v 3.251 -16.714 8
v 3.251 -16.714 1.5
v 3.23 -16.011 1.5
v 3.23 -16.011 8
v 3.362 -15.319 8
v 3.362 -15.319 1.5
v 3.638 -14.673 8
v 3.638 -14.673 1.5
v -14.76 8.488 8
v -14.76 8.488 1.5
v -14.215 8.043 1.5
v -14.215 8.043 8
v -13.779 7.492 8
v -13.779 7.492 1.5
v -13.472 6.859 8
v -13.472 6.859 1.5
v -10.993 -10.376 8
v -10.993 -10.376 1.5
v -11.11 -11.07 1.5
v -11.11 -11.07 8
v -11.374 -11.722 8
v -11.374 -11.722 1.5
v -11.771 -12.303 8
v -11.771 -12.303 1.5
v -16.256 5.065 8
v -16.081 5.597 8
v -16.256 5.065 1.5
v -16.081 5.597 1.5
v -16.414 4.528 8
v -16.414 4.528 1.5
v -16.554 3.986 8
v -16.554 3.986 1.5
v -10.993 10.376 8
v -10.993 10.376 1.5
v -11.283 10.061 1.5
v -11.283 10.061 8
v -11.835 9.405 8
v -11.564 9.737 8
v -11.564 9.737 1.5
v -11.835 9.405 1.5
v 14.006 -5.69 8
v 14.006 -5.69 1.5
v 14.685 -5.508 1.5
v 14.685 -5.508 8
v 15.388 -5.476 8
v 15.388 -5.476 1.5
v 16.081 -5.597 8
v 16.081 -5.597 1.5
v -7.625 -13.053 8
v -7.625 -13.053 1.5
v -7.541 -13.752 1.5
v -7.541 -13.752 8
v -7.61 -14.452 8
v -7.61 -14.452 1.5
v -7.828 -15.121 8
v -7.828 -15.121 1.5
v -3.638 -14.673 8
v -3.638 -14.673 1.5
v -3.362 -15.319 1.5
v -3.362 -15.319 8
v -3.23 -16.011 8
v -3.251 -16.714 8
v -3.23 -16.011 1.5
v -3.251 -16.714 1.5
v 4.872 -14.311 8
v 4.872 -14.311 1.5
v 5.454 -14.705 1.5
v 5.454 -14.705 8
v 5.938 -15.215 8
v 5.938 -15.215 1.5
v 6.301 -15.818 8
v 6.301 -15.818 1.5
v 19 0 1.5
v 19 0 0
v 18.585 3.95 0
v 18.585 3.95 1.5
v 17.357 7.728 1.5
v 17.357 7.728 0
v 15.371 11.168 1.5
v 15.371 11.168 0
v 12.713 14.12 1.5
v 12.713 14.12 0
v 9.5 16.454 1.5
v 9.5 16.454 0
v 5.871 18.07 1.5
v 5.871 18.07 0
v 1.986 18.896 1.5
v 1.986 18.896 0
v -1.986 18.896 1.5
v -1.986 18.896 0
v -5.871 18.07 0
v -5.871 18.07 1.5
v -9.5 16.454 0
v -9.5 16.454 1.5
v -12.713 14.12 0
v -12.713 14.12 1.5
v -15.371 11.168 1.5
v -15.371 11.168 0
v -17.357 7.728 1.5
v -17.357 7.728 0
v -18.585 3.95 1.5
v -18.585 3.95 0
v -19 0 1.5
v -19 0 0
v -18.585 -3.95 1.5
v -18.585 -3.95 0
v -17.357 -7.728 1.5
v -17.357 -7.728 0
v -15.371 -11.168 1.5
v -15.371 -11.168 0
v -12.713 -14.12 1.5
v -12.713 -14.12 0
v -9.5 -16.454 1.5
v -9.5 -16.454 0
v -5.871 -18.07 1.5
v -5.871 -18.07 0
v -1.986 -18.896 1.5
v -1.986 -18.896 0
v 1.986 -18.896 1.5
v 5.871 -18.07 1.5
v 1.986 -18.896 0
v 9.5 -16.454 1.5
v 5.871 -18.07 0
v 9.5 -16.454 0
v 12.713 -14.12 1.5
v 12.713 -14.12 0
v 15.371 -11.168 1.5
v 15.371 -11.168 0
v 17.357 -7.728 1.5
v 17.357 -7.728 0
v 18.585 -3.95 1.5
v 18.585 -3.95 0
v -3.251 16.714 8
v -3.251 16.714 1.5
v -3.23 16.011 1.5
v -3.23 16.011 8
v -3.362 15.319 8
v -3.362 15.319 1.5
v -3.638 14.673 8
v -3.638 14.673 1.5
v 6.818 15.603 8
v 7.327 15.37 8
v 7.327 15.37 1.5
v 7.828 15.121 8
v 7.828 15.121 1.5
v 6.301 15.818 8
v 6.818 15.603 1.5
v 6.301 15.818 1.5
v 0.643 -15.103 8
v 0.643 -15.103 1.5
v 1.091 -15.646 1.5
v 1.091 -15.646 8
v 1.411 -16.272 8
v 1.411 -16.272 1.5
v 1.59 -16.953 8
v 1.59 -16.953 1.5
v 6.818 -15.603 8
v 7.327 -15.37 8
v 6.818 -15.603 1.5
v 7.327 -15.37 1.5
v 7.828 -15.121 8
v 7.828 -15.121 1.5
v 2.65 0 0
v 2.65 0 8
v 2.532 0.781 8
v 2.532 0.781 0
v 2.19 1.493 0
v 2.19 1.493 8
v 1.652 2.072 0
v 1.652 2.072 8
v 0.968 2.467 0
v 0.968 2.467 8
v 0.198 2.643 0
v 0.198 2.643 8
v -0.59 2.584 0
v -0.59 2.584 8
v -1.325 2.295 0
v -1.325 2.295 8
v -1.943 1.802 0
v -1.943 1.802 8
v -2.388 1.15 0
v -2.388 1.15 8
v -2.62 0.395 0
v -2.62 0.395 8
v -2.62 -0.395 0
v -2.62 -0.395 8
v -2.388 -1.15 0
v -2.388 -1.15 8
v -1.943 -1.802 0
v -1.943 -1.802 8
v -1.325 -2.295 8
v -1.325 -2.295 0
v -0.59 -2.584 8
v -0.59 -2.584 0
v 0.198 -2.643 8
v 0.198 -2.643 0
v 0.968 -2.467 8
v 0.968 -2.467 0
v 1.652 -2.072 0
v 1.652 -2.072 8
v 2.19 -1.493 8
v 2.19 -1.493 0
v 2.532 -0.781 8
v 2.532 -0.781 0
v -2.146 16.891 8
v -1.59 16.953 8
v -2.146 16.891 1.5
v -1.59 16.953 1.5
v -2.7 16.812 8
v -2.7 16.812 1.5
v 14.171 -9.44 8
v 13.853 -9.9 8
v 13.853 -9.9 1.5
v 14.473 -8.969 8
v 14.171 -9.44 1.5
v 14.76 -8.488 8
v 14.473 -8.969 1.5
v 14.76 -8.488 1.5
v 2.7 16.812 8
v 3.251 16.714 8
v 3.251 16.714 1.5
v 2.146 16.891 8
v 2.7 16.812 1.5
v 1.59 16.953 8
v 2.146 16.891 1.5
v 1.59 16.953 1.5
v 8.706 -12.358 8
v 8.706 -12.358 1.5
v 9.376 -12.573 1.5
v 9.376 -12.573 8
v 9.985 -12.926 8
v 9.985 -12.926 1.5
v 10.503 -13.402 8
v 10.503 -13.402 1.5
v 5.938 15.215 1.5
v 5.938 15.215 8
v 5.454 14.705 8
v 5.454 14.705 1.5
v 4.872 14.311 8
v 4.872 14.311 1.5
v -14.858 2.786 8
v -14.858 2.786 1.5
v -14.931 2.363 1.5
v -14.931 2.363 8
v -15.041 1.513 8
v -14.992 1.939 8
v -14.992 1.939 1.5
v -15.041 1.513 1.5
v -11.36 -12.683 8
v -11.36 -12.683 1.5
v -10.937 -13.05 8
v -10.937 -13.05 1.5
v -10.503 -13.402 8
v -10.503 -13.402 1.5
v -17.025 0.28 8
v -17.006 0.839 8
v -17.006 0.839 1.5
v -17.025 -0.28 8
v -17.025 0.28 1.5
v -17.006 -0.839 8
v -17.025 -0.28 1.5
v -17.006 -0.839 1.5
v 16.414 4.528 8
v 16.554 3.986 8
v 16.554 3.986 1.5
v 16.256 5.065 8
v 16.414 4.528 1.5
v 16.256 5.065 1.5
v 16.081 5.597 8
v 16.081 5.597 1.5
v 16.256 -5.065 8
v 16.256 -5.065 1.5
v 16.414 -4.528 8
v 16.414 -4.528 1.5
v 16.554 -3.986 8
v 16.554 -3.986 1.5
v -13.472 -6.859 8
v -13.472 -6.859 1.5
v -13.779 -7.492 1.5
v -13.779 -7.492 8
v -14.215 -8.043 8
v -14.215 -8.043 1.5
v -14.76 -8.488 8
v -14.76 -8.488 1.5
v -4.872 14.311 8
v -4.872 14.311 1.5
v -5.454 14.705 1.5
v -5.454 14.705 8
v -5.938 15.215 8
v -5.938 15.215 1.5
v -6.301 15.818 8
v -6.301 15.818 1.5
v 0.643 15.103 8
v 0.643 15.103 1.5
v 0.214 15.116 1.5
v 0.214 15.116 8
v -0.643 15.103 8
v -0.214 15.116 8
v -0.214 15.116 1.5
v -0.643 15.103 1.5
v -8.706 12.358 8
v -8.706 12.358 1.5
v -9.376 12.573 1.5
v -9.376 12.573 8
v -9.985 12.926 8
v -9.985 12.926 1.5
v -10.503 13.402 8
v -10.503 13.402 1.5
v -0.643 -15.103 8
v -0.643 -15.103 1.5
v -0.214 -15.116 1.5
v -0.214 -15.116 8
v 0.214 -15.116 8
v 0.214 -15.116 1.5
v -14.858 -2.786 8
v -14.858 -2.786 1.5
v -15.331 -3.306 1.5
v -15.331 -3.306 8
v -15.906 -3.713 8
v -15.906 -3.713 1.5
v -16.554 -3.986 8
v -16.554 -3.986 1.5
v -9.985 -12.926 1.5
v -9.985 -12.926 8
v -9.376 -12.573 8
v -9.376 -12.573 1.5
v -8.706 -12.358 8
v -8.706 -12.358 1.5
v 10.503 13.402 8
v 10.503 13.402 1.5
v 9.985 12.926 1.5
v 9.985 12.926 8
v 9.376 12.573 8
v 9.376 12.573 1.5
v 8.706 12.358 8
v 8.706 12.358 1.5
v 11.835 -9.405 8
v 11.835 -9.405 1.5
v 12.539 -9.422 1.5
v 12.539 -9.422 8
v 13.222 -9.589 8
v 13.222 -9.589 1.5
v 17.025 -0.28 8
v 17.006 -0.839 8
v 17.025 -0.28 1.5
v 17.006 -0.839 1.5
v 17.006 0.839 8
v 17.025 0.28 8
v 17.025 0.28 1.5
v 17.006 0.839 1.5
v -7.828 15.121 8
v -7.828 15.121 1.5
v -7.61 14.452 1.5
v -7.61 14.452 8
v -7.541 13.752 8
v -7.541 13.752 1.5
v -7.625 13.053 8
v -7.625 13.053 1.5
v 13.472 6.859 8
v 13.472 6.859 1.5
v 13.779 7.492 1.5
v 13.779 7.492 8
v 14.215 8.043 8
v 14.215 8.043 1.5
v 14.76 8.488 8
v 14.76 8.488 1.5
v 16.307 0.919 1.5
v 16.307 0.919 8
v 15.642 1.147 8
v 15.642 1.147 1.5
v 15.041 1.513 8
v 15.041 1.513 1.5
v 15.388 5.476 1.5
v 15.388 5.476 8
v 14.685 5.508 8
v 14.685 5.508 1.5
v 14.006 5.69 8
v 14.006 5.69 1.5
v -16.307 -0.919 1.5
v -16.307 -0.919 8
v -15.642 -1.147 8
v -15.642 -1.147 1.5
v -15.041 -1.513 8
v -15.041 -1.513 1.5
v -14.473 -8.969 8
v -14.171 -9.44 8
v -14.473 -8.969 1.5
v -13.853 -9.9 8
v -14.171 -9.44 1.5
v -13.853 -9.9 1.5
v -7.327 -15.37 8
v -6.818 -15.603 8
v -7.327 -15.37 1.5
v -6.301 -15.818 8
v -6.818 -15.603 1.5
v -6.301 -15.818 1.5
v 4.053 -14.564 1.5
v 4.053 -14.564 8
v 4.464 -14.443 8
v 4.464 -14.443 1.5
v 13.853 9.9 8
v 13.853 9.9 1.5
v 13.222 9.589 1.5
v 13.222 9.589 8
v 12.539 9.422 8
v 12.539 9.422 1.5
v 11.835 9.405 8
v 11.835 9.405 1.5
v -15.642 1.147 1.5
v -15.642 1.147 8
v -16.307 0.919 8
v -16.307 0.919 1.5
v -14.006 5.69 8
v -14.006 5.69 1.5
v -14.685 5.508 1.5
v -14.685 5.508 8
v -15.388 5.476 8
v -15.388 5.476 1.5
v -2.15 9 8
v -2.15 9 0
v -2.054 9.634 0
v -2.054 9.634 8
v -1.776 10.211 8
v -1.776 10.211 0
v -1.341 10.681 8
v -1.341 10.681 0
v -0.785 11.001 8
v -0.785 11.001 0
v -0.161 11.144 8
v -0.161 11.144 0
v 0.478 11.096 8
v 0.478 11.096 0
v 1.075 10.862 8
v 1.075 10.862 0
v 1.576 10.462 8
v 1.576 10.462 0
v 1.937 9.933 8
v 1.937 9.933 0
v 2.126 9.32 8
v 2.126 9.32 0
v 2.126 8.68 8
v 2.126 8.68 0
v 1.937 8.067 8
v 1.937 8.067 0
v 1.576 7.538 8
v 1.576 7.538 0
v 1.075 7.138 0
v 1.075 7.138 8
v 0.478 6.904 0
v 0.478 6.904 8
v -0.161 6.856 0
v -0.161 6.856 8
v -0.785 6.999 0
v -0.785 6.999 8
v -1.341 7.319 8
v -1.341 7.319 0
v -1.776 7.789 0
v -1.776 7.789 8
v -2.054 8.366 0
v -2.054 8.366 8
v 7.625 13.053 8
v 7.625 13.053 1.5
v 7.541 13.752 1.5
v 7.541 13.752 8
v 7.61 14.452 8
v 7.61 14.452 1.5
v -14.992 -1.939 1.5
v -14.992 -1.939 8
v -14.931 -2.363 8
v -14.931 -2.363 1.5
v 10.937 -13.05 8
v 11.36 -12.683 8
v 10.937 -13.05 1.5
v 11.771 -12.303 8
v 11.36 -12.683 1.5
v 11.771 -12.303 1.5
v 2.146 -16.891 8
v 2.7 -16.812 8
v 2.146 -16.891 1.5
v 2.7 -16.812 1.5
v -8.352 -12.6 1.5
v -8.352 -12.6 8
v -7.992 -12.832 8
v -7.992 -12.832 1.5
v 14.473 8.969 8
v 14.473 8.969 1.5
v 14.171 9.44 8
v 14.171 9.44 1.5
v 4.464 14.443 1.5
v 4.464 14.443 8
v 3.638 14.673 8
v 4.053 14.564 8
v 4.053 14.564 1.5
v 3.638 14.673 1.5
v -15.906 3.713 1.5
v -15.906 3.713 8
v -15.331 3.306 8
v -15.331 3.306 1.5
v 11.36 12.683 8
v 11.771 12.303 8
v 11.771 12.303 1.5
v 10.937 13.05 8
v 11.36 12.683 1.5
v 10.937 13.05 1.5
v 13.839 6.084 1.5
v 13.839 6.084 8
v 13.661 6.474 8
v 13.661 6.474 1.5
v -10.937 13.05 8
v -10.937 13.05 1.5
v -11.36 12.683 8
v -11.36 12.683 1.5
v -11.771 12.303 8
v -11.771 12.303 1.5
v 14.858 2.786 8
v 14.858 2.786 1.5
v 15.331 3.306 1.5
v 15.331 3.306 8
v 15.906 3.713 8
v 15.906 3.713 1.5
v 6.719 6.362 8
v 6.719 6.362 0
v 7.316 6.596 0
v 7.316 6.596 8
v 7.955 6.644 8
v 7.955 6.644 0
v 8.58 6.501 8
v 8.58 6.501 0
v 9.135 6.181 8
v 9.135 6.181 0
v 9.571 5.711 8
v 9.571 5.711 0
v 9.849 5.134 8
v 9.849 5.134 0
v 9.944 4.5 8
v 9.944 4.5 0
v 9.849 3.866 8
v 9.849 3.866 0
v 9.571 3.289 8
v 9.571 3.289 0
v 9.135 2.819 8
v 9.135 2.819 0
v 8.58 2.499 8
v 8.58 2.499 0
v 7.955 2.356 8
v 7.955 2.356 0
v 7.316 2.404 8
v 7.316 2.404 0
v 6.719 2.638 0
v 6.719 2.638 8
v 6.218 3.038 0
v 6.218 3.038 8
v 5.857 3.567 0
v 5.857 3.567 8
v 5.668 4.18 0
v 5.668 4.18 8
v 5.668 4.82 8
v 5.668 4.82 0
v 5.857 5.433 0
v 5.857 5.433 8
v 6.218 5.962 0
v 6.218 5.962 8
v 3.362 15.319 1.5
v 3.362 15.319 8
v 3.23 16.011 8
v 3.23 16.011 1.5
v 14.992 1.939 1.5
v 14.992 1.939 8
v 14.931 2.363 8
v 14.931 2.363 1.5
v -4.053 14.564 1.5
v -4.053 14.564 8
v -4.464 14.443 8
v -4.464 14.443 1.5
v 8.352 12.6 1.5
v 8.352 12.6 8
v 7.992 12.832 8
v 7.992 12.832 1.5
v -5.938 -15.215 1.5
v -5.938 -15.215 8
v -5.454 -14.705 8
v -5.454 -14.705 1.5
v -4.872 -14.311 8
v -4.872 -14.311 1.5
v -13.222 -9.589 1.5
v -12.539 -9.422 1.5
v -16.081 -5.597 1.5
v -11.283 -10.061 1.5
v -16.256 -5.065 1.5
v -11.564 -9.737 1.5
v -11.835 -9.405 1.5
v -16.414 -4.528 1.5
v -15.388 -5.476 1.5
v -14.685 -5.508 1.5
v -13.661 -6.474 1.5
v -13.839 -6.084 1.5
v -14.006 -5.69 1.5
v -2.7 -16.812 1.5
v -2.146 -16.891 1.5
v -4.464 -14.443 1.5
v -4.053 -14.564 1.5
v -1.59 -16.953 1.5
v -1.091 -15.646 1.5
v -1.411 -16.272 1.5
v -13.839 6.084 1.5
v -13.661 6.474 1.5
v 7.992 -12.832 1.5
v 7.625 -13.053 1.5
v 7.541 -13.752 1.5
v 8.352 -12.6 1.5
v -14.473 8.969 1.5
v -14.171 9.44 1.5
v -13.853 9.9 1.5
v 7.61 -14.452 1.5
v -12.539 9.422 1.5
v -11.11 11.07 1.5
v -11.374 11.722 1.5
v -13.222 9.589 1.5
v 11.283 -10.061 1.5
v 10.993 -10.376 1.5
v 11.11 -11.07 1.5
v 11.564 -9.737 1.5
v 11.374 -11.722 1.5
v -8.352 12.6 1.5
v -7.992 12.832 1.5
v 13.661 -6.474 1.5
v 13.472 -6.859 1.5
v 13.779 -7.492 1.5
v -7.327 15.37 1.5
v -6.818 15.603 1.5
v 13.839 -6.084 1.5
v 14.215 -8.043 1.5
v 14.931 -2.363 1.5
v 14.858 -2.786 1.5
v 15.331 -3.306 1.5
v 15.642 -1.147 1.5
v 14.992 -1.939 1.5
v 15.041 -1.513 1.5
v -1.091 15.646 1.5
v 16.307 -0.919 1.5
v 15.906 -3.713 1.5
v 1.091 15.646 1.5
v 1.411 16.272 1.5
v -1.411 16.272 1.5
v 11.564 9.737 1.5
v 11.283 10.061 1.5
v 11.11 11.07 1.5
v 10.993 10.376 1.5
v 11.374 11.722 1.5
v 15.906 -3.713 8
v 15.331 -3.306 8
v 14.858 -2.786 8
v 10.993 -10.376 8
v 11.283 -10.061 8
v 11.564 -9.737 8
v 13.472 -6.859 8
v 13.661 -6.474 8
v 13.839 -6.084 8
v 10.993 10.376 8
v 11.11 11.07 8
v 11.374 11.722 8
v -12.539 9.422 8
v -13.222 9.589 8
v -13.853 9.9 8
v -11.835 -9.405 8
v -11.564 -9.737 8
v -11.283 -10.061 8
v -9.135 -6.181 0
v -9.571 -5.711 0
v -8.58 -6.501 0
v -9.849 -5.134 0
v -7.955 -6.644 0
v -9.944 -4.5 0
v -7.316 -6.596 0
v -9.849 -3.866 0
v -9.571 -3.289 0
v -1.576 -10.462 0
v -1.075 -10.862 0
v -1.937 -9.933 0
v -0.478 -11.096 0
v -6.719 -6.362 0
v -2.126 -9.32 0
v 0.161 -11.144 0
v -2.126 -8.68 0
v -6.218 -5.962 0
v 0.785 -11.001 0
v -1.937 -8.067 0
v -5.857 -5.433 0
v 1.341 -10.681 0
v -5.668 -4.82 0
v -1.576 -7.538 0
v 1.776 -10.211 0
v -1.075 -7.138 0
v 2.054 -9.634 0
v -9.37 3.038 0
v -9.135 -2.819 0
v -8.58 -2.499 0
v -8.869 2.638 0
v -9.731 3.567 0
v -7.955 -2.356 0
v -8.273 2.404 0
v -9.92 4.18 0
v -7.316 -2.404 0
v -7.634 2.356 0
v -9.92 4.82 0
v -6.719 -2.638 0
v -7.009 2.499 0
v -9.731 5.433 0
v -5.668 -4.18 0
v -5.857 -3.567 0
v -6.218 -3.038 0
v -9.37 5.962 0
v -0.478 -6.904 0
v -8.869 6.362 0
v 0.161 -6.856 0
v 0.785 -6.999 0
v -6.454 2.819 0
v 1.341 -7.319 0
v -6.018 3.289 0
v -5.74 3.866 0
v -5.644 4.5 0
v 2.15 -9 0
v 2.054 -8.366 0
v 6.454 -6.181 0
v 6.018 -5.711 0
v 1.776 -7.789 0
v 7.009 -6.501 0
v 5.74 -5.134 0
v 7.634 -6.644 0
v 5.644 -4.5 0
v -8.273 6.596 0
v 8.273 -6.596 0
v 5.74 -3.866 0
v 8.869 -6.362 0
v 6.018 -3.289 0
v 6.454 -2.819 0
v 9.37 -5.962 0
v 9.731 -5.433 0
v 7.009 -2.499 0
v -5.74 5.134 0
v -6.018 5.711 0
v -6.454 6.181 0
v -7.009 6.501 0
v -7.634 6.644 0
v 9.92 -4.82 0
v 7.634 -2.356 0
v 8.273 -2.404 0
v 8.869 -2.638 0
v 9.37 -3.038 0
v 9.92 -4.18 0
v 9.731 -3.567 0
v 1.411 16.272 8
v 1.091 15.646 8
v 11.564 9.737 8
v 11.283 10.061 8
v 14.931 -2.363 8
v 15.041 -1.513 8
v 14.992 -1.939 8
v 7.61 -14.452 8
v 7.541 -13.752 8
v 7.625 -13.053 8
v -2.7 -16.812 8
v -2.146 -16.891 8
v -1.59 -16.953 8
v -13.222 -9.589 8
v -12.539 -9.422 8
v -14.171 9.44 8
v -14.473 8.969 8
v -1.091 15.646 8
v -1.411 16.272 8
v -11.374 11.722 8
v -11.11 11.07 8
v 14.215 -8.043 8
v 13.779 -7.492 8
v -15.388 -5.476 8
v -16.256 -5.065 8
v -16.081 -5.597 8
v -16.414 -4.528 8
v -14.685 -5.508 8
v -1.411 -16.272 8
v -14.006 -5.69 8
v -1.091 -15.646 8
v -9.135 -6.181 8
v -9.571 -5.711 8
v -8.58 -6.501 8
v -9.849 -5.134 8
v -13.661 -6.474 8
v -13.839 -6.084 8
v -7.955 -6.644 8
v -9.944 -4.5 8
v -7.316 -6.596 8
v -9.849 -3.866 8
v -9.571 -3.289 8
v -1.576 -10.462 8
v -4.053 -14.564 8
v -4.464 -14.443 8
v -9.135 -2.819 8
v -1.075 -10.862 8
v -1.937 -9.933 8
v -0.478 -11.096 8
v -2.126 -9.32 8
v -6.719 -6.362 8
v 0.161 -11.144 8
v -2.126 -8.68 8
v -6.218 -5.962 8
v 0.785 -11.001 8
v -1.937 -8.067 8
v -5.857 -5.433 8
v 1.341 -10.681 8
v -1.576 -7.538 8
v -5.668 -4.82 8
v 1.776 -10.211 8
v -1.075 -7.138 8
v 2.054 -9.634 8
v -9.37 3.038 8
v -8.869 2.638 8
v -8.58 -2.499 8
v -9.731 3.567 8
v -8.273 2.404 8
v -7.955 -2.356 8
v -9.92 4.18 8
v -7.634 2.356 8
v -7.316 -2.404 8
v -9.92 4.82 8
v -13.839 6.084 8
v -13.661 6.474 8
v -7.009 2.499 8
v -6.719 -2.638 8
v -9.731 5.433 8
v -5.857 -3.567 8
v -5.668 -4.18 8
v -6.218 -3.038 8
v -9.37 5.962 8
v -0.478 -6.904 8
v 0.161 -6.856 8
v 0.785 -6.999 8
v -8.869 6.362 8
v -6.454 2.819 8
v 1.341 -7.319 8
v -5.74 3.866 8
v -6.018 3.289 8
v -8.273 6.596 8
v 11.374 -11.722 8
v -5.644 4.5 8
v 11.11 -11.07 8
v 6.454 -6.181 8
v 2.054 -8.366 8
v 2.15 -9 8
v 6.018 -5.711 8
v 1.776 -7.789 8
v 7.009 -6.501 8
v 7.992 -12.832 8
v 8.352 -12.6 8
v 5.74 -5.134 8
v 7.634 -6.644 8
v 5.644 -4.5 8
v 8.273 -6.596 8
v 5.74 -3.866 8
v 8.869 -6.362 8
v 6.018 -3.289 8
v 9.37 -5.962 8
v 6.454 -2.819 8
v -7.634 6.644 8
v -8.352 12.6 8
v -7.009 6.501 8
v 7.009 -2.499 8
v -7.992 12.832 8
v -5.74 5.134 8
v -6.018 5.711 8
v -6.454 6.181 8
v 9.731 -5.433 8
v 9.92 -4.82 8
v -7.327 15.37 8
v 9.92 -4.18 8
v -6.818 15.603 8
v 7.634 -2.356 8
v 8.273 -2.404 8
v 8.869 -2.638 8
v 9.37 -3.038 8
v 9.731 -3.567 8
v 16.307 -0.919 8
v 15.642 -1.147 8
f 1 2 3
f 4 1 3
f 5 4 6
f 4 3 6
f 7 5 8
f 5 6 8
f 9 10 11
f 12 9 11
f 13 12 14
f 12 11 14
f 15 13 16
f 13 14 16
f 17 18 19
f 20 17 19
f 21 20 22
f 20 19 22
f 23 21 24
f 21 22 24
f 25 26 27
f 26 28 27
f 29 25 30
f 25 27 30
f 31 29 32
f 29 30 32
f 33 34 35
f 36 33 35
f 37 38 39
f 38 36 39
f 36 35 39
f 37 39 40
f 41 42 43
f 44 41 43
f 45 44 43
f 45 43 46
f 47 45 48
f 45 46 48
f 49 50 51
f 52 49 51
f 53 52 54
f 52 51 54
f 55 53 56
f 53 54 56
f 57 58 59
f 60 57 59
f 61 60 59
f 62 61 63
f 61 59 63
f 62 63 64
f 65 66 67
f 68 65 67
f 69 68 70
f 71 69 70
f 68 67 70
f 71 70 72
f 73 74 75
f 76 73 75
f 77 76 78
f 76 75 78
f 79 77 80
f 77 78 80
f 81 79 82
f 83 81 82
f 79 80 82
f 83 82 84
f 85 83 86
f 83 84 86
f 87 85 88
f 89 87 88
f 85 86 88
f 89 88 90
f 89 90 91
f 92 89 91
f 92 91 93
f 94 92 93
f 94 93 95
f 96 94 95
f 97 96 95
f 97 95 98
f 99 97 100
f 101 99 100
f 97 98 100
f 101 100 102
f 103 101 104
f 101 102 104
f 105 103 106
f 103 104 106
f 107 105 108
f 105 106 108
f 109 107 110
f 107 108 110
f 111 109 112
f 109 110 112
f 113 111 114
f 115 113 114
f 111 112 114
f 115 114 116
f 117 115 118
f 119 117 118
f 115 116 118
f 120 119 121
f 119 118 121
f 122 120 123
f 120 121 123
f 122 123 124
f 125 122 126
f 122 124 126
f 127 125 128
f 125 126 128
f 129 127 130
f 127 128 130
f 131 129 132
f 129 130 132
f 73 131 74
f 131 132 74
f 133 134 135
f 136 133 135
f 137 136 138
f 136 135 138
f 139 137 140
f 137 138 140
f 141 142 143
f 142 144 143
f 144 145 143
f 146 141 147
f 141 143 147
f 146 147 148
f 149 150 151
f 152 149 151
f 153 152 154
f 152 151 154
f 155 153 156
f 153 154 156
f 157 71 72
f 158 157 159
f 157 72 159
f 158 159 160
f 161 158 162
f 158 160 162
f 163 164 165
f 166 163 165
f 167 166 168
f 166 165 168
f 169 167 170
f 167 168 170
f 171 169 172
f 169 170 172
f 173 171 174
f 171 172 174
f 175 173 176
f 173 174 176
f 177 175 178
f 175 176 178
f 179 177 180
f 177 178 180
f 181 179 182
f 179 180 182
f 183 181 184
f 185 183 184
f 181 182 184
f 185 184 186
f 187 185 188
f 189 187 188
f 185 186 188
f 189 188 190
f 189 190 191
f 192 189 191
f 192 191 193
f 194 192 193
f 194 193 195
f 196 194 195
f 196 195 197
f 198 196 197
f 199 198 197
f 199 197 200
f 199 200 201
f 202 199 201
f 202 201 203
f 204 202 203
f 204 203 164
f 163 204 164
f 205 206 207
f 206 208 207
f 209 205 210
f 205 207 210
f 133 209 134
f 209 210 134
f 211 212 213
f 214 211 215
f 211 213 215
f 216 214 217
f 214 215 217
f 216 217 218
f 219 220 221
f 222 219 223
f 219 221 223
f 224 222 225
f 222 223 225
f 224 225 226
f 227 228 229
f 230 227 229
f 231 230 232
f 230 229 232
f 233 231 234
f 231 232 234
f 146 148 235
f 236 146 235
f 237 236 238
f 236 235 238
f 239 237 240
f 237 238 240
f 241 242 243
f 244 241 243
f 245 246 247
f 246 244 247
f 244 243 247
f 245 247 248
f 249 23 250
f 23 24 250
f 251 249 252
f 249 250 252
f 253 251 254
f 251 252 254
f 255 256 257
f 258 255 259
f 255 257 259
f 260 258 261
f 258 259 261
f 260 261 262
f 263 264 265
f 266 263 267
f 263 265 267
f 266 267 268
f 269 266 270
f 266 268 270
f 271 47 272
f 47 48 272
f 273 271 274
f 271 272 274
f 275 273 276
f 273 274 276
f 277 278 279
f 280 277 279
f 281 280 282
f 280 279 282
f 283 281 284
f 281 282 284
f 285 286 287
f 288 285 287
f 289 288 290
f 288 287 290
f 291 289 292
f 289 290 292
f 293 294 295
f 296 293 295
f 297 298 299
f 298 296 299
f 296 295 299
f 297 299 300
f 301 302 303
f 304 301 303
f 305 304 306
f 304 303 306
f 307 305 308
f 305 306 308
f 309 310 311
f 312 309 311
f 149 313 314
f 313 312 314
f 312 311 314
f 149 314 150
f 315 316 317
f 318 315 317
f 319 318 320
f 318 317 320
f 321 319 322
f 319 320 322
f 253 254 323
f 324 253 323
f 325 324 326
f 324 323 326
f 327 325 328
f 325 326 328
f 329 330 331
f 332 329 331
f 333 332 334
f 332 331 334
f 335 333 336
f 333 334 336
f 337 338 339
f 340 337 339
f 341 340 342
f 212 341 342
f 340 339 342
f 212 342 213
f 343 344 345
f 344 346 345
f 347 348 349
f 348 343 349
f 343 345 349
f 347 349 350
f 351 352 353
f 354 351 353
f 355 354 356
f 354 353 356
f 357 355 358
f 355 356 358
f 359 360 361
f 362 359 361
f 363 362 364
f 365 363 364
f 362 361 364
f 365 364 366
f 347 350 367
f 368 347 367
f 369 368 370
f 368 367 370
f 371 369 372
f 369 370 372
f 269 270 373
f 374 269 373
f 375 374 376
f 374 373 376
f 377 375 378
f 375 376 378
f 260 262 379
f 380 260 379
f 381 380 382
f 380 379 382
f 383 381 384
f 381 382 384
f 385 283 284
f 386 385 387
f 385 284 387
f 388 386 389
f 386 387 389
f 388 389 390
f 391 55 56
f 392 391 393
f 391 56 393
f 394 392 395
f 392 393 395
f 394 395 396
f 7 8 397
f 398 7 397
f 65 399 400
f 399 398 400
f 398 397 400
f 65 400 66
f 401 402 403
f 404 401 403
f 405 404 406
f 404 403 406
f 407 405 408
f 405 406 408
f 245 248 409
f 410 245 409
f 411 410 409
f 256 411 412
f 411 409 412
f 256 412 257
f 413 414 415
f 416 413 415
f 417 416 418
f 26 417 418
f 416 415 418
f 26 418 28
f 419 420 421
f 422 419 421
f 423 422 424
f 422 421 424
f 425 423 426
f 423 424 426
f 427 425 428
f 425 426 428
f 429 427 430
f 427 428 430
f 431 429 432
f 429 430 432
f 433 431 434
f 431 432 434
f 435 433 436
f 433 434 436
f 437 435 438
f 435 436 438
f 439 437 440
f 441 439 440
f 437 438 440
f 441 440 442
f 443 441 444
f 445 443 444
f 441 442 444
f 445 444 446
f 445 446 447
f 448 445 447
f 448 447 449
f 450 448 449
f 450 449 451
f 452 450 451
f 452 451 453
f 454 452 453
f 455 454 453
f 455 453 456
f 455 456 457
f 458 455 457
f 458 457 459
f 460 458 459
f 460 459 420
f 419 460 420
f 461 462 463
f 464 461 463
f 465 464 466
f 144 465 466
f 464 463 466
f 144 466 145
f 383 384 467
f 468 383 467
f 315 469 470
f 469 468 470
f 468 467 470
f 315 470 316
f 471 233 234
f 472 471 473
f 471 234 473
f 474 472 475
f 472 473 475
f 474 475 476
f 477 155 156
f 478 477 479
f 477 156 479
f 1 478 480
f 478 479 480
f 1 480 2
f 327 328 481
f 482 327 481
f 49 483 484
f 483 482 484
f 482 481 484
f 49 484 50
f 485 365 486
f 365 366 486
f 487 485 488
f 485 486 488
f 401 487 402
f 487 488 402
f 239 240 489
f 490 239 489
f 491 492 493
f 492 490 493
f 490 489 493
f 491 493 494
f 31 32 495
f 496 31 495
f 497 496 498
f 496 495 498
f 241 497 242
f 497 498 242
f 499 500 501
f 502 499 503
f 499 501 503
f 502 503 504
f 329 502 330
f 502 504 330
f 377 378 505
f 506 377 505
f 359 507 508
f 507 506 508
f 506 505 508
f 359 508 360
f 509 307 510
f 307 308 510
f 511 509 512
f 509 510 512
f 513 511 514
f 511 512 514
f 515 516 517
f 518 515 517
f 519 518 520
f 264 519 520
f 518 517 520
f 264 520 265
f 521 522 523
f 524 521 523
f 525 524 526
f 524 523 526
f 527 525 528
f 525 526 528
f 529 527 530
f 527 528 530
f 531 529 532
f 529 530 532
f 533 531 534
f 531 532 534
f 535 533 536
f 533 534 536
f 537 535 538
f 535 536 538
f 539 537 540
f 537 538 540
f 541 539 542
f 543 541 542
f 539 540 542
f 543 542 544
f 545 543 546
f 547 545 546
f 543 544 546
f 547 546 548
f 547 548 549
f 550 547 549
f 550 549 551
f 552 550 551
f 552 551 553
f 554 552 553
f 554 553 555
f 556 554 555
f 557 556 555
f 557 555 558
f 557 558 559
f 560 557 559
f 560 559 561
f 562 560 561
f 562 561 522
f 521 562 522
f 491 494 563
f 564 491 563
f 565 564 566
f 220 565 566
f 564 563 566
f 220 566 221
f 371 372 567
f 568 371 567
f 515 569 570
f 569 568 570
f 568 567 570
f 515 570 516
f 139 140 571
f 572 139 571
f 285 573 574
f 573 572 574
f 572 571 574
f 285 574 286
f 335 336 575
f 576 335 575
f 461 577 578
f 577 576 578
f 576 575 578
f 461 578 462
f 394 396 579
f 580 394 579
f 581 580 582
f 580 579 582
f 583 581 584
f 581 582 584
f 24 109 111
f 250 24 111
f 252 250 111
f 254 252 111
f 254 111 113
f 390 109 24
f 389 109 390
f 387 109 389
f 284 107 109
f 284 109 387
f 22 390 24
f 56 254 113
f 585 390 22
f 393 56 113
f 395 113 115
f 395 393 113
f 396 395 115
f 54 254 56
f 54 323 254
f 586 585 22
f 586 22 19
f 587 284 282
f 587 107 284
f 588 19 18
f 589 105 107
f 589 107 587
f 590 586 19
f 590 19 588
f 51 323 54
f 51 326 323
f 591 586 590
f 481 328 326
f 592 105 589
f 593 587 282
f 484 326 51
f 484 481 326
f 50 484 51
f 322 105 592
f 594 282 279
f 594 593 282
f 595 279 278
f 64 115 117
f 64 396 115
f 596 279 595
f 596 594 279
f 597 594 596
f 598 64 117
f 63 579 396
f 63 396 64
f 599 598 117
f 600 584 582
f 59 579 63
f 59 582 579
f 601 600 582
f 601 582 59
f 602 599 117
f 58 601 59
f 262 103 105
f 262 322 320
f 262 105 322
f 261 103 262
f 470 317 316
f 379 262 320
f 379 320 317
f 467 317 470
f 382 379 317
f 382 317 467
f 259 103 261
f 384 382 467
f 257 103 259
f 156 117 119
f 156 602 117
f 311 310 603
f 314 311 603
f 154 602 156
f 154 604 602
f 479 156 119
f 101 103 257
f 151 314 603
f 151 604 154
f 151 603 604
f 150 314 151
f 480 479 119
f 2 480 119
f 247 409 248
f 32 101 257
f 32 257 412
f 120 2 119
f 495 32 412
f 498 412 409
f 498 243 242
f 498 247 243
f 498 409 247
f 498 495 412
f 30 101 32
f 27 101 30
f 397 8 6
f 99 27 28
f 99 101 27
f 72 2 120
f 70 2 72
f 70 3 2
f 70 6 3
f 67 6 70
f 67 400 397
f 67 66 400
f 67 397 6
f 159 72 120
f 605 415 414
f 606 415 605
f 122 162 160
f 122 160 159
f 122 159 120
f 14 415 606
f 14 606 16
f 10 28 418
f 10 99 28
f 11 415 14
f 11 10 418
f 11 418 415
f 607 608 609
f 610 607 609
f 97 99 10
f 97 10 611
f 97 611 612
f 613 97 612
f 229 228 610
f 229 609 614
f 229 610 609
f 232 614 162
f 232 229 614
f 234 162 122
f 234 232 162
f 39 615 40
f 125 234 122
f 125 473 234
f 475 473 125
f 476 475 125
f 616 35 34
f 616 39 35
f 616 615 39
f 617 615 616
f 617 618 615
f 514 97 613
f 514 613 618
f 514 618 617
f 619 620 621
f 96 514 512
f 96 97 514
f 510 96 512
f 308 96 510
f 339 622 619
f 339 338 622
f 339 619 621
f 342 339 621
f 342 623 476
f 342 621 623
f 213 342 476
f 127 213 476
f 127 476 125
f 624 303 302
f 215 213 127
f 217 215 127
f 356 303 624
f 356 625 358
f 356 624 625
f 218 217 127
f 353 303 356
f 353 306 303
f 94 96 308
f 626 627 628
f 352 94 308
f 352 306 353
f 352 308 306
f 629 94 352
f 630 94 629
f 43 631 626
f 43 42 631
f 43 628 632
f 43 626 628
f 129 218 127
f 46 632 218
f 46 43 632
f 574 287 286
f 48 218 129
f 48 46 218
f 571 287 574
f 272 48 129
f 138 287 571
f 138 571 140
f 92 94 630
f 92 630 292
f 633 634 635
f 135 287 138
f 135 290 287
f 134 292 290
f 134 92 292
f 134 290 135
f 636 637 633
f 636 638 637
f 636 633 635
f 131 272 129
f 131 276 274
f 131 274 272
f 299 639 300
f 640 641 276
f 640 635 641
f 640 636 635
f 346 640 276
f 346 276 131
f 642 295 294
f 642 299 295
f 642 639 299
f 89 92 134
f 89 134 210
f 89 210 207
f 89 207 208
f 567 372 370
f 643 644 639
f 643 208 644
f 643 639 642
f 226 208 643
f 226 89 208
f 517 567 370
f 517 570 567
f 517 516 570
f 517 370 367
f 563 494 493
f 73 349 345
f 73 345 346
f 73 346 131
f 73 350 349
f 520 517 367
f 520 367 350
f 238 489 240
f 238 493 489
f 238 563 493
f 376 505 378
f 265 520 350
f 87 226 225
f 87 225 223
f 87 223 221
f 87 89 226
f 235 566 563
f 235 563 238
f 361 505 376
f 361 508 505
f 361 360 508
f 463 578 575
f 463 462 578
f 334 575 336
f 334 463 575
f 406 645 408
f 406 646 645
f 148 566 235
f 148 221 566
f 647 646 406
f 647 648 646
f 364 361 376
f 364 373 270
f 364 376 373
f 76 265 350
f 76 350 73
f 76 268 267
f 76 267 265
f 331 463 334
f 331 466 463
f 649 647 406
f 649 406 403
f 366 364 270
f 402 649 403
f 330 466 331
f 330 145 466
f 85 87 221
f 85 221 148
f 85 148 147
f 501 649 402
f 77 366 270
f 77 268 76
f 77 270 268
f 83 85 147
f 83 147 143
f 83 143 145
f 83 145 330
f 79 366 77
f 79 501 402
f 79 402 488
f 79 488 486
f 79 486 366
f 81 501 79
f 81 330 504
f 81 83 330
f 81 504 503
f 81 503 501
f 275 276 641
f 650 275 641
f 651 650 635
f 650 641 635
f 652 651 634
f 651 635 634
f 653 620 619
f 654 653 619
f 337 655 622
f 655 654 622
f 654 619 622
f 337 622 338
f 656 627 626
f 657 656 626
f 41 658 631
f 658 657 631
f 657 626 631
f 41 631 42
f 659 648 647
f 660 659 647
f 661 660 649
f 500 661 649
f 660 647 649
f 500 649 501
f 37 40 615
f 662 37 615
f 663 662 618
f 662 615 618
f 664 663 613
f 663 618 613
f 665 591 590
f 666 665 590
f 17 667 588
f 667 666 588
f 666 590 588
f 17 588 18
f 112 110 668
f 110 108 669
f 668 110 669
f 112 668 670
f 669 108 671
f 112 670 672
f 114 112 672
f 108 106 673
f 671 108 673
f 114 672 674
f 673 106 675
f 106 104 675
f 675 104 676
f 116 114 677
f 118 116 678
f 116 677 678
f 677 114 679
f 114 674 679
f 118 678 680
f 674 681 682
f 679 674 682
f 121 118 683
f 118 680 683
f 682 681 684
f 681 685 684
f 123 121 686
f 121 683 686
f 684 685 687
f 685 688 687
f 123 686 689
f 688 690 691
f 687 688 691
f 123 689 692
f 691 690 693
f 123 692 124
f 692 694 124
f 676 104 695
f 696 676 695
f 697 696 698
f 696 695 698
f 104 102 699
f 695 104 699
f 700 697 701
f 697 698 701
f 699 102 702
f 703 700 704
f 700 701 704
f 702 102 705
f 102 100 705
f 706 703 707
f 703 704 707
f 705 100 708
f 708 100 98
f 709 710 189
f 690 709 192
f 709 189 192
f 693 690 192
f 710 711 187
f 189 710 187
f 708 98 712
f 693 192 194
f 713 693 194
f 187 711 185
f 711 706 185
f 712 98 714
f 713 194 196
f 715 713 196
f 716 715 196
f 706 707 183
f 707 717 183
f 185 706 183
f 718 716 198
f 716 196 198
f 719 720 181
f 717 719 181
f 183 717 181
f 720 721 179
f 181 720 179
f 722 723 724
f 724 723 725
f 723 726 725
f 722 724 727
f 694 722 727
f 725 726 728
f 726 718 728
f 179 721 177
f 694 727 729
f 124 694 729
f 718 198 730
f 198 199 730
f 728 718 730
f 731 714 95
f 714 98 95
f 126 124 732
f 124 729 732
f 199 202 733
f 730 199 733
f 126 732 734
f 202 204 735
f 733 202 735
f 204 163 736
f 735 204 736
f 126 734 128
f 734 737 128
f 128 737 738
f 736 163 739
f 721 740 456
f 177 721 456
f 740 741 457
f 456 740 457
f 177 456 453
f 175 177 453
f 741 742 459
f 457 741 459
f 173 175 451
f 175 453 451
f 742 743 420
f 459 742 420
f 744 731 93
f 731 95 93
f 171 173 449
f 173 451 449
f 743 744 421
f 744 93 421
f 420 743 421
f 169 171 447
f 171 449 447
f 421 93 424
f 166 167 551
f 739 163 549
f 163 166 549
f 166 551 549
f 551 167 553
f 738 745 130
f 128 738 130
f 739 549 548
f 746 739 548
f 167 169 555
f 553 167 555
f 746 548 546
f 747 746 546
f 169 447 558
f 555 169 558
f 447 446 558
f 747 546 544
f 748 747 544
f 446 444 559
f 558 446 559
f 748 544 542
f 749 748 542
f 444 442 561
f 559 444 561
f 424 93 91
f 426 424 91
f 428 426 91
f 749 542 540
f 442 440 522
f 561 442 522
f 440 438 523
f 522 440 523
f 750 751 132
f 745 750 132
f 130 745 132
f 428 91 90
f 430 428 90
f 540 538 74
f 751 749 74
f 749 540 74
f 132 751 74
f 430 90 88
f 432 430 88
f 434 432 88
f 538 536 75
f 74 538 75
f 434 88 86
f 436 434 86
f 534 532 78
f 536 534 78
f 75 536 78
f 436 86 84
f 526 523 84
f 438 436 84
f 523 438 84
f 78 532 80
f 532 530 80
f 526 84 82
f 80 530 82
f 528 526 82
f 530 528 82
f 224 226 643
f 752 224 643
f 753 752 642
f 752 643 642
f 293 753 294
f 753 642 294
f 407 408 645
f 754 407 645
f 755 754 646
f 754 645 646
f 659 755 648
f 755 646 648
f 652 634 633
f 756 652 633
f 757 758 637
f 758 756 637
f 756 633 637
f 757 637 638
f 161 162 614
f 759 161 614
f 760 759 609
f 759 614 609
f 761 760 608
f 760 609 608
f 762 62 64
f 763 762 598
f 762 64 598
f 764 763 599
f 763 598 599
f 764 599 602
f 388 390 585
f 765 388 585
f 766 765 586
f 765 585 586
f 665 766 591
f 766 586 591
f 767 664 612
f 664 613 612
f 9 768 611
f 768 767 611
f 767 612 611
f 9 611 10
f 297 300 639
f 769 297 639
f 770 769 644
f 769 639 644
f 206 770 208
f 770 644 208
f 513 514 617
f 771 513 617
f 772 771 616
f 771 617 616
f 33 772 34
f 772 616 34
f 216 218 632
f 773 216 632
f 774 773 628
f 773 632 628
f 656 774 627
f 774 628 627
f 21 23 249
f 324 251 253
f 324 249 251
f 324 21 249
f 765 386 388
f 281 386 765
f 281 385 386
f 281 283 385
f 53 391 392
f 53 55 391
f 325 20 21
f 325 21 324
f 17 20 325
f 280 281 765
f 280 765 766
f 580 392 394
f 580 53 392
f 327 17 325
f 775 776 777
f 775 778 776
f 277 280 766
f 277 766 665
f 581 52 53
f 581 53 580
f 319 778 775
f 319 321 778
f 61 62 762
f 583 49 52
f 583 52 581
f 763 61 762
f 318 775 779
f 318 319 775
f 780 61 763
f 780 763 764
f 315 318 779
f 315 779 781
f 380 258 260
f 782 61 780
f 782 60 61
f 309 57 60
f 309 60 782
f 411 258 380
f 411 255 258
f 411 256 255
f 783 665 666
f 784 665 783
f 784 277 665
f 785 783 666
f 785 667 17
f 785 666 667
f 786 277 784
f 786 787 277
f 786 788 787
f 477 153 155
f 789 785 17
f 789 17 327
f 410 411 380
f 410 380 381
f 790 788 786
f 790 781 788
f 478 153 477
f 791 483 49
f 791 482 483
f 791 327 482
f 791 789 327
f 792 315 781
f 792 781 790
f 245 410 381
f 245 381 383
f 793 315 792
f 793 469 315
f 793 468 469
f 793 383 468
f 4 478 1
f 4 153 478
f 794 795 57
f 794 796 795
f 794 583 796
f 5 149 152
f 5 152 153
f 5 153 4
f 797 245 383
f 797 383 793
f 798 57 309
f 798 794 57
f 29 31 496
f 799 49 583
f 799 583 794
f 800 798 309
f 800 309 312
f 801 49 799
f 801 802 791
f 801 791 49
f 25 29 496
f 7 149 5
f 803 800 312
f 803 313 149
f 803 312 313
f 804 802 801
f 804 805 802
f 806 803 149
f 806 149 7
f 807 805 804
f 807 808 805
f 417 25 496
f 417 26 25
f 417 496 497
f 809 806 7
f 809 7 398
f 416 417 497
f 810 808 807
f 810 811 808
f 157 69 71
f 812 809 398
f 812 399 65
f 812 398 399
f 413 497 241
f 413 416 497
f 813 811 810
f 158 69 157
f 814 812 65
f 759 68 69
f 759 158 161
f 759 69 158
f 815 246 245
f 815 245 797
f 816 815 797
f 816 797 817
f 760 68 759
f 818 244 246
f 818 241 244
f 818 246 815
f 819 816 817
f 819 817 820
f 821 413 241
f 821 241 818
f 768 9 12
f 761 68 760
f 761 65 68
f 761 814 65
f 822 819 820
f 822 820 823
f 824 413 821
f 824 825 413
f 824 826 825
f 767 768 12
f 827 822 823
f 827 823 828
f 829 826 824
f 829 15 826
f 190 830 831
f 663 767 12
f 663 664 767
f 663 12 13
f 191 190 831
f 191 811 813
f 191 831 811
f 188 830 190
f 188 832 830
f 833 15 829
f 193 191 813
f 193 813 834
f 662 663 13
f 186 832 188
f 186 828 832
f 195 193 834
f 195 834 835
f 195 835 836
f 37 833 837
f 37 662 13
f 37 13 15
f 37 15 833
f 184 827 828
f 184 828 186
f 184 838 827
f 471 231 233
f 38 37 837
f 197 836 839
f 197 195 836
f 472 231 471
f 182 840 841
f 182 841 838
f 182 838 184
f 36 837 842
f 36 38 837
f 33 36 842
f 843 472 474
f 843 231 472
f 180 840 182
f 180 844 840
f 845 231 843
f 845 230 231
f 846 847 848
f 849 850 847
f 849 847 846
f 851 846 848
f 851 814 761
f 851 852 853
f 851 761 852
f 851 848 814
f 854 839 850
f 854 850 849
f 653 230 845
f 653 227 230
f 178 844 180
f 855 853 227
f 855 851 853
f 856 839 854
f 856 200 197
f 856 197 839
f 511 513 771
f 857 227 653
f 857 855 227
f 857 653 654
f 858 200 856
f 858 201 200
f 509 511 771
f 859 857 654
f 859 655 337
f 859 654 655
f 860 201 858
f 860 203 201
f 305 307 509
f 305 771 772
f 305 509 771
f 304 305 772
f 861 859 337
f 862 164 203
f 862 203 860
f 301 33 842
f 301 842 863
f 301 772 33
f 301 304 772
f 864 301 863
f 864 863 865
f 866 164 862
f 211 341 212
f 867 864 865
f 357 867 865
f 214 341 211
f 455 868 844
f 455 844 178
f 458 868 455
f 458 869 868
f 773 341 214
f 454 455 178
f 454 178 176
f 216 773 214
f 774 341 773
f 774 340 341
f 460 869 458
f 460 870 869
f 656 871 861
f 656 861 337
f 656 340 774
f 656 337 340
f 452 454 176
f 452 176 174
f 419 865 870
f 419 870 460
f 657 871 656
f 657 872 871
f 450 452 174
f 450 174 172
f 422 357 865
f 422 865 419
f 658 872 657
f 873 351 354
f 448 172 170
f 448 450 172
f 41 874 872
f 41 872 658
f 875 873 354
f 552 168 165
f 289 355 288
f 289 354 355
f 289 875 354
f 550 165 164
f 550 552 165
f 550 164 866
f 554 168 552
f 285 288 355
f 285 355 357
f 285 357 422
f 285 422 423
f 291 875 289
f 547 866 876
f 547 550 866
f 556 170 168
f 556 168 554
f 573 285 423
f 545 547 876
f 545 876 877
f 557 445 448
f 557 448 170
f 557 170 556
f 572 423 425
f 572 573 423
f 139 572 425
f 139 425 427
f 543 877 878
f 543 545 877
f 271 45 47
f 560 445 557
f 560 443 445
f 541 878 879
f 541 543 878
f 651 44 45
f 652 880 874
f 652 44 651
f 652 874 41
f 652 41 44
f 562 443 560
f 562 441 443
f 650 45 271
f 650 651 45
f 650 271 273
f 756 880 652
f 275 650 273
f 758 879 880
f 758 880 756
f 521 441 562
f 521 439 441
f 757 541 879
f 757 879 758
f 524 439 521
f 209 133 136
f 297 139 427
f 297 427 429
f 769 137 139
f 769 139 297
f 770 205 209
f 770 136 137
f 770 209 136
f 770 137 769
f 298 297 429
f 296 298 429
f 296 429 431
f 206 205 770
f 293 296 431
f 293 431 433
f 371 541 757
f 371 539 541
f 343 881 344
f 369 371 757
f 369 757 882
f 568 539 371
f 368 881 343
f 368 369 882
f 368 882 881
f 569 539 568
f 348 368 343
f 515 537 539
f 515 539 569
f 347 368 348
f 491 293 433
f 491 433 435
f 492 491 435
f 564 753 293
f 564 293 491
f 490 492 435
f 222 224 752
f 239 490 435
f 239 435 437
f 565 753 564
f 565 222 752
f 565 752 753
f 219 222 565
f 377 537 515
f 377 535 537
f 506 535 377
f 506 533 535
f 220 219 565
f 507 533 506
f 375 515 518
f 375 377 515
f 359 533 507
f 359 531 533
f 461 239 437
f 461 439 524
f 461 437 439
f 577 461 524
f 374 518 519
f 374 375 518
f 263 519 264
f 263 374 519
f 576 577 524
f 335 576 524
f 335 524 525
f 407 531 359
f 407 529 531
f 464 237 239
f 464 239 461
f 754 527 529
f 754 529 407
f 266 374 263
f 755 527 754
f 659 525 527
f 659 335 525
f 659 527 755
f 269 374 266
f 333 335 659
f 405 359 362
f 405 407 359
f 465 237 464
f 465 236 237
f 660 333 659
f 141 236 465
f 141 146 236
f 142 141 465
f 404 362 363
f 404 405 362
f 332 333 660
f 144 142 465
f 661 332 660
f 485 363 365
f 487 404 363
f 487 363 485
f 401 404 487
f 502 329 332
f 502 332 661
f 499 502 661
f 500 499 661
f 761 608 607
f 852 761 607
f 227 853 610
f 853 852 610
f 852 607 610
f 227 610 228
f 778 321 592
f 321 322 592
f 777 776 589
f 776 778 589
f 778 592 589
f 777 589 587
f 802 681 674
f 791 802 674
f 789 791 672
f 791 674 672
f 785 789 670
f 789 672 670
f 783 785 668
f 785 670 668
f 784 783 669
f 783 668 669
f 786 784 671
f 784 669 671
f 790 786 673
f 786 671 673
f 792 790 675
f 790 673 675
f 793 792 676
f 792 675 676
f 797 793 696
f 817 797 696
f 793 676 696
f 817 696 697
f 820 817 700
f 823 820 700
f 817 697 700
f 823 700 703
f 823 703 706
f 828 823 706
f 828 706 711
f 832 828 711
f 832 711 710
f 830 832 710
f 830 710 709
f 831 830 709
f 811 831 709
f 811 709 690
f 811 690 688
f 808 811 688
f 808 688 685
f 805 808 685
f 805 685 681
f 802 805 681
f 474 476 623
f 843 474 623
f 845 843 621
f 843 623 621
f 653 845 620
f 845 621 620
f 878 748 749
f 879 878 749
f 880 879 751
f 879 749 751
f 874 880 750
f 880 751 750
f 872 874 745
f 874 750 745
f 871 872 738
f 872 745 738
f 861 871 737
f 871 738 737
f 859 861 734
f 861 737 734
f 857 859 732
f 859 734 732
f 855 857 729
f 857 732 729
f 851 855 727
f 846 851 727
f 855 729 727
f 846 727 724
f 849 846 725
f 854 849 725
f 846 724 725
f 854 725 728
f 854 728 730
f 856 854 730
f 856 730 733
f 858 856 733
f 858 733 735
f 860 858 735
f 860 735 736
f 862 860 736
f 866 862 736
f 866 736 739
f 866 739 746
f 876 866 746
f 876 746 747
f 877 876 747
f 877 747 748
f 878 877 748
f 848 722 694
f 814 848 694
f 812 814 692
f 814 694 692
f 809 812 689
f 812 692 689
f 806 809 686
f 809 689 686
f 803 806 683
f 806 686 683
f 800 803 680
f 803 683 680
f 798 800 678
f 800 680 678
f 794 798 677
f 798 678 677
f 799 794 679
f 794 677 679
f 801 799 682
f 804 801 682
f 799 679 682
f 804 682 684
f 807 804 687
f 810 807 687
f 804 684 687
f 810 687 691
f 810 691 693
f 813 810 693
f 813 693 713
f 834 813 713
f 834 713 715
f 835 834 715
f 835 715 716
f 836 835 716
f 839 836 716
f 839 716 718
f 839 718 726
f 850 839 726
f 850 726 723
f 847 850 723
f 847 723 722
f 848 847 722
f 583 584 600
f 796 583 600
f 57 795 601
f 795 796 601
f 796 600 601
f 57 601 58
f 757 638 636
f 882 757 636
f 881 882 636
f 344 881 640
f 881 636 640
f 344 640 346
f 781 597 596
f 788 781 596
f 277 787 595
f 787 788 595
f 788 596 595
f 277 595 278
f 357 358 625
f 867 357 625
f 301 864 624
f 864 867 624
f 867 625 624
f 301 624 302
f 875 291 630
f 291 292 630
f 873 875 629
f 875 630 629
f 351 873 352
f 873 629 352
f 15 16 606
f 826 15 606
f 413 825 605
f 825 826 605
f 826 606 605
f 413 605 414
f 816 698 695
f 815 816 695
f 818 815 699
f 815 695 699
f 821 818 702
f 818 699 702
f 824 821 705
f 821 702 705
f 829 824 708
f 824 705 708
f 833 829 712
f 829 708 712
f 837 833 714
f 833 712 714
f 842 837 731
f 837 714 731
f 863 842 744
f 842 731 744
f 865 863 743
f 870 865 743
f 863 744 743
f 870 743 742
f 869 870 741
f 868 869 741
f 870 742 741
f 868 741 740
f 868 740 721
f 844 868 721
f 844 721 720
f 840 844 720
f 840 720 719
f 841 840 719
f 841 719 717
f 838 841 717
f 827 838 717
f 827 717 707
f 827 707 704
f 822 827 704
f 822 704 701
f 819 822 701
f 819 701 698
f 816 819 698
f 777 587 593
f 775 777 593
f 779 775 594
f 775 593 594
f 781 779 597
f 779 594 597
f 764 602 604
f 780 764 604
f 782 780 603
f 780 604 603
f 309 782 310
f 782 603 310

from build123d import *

# Parameters (mm, degrees)
SKETCH_1_R               = 17.02704374
EXTRUDE_1_DEPTH          = 6
SKETCH_1_6_R             = 17.02704374
EXTRUDE_2_DEPTH          = 8
SKETCH_1_7_R             = 19
EXTRUDE_3_DEPTH          = 1.5
CUT_EXTRUDE_START        = 1.5
CUT_EXTRUDE_3_DEPTH      = 27.535691538
PATTERN_CIRCULAR_1_COUNT = 22
HOLE_WIZARD_M4_1_D       = 4.3
PATTERN_CIRCULAR_2_COUNT = 6
HOLE_WIZARD_M5_1_D       = 5.3


with BuildPart() as part:
    # ｽｹｯﾁ1 → ﾎﾞｽ - 押し出し1 (new body)
    with BuildSketch(Plane.XY):
        Circle(SKETCH_1_R)
    extrude(amount=EXTRUDE_1_DEPTH)

    # ｽｹｯﾁ1<6> → ﾎﾞｽ - 押し出し2 (add)
    with BuildSketch(Plane.XY):
        Circle(SKETCH_1_6_R)
    extrude(amount=EXTRUDE_2_DEPTH)

    # ｽｹｯﾁ1<7> → ﾎﾞｽ - 押し出し3 (add)
    with BuildSketch(Plane.XY):
        Circle(SKETCH_1_7_R)
    extrude(amount=EXTRUDE_3_DEPTH)

    # ｽｹｯﾁ3 → ｶｯﾄ - 押し出し3 (cut, through all)
    with BuildSketch(Plane.XY.offset(CUT_EXTRUDE_START)):
        with BuildLine():
            ThreePointArc((0.642707961, 15.103375051), (1.267879301, 15.950333421), (1.58954065, 16.952686485))
            ThreePointArc((1.58954065, 16.952686485), (0, 17.02704374), (-1.58954065, 16.952686485))
            ThreePointArc((-1.58954065, 16.952686485), (-1.267879301, 15.950333421), (-0.642707961, 15.103375051))
            ThreePointArc((-0.642707961, 15.103375051), (0, 15.11704374), (0.642707961, 15.103375051))
        make_face()
    cut_extrude_3 = extrude(amount=CUT_EXTRUDE_3_DEPTH, mode=Mode.SUBTRACT)

    # 円形ﾊﾟﾀｰﾝ1: ｶｯﾄ - 押し出し3 ×22 about axis
    pattern_circular_1_axis = Axis((0, 0, 6), (0, 0, -1))
    for i in range(1, PATTERN_CIRCULAR_1_COUNT):
        add(cut_extrude_3.rotate(pattern_circular_1_axis, i * 360 / PATTERN_CIRCULAR_1_COUNT), mode=Mode.SUBTRACT)

    # M4 すきま穴1 (through all)
    with Locations(Plane(origin=(0, 9, 8), x_dir=(1, 0, 0), z_dir=(0, 0, 1))):
        with Locations((0, 0)):
            hole_wizard_m4_1 = Hole(HOLE_WIZARD_M4_1_D / 2)

    # 円形ﾊﾟﾀｰﾝ2: M4 すきま穴1 ×6 about axis
    pattern_circular_2_axis = Axis((0, 0, 1.5), (0, 0, -1))
    for i in range(1, PATTERN_CIRCULAR_2_COUNT):
        add(hole_wizard_m4_1.rotate(pattern_circular_2_axis, i * 360 / PATTERN_CIRCULAR_2_COUNT), mode=Mode.SUBTRACT)

    # M5 すきま穴1 (through all)
    with Locations(Plane(origin=(0, 0, 0), x_dir=(-1, 0, 0), z_dir=(0, 0, -1))):
        with Locations((0, 0)):
            Hole(HOLE_WIZARD_M5_1_D / 2)


solid = part.part
